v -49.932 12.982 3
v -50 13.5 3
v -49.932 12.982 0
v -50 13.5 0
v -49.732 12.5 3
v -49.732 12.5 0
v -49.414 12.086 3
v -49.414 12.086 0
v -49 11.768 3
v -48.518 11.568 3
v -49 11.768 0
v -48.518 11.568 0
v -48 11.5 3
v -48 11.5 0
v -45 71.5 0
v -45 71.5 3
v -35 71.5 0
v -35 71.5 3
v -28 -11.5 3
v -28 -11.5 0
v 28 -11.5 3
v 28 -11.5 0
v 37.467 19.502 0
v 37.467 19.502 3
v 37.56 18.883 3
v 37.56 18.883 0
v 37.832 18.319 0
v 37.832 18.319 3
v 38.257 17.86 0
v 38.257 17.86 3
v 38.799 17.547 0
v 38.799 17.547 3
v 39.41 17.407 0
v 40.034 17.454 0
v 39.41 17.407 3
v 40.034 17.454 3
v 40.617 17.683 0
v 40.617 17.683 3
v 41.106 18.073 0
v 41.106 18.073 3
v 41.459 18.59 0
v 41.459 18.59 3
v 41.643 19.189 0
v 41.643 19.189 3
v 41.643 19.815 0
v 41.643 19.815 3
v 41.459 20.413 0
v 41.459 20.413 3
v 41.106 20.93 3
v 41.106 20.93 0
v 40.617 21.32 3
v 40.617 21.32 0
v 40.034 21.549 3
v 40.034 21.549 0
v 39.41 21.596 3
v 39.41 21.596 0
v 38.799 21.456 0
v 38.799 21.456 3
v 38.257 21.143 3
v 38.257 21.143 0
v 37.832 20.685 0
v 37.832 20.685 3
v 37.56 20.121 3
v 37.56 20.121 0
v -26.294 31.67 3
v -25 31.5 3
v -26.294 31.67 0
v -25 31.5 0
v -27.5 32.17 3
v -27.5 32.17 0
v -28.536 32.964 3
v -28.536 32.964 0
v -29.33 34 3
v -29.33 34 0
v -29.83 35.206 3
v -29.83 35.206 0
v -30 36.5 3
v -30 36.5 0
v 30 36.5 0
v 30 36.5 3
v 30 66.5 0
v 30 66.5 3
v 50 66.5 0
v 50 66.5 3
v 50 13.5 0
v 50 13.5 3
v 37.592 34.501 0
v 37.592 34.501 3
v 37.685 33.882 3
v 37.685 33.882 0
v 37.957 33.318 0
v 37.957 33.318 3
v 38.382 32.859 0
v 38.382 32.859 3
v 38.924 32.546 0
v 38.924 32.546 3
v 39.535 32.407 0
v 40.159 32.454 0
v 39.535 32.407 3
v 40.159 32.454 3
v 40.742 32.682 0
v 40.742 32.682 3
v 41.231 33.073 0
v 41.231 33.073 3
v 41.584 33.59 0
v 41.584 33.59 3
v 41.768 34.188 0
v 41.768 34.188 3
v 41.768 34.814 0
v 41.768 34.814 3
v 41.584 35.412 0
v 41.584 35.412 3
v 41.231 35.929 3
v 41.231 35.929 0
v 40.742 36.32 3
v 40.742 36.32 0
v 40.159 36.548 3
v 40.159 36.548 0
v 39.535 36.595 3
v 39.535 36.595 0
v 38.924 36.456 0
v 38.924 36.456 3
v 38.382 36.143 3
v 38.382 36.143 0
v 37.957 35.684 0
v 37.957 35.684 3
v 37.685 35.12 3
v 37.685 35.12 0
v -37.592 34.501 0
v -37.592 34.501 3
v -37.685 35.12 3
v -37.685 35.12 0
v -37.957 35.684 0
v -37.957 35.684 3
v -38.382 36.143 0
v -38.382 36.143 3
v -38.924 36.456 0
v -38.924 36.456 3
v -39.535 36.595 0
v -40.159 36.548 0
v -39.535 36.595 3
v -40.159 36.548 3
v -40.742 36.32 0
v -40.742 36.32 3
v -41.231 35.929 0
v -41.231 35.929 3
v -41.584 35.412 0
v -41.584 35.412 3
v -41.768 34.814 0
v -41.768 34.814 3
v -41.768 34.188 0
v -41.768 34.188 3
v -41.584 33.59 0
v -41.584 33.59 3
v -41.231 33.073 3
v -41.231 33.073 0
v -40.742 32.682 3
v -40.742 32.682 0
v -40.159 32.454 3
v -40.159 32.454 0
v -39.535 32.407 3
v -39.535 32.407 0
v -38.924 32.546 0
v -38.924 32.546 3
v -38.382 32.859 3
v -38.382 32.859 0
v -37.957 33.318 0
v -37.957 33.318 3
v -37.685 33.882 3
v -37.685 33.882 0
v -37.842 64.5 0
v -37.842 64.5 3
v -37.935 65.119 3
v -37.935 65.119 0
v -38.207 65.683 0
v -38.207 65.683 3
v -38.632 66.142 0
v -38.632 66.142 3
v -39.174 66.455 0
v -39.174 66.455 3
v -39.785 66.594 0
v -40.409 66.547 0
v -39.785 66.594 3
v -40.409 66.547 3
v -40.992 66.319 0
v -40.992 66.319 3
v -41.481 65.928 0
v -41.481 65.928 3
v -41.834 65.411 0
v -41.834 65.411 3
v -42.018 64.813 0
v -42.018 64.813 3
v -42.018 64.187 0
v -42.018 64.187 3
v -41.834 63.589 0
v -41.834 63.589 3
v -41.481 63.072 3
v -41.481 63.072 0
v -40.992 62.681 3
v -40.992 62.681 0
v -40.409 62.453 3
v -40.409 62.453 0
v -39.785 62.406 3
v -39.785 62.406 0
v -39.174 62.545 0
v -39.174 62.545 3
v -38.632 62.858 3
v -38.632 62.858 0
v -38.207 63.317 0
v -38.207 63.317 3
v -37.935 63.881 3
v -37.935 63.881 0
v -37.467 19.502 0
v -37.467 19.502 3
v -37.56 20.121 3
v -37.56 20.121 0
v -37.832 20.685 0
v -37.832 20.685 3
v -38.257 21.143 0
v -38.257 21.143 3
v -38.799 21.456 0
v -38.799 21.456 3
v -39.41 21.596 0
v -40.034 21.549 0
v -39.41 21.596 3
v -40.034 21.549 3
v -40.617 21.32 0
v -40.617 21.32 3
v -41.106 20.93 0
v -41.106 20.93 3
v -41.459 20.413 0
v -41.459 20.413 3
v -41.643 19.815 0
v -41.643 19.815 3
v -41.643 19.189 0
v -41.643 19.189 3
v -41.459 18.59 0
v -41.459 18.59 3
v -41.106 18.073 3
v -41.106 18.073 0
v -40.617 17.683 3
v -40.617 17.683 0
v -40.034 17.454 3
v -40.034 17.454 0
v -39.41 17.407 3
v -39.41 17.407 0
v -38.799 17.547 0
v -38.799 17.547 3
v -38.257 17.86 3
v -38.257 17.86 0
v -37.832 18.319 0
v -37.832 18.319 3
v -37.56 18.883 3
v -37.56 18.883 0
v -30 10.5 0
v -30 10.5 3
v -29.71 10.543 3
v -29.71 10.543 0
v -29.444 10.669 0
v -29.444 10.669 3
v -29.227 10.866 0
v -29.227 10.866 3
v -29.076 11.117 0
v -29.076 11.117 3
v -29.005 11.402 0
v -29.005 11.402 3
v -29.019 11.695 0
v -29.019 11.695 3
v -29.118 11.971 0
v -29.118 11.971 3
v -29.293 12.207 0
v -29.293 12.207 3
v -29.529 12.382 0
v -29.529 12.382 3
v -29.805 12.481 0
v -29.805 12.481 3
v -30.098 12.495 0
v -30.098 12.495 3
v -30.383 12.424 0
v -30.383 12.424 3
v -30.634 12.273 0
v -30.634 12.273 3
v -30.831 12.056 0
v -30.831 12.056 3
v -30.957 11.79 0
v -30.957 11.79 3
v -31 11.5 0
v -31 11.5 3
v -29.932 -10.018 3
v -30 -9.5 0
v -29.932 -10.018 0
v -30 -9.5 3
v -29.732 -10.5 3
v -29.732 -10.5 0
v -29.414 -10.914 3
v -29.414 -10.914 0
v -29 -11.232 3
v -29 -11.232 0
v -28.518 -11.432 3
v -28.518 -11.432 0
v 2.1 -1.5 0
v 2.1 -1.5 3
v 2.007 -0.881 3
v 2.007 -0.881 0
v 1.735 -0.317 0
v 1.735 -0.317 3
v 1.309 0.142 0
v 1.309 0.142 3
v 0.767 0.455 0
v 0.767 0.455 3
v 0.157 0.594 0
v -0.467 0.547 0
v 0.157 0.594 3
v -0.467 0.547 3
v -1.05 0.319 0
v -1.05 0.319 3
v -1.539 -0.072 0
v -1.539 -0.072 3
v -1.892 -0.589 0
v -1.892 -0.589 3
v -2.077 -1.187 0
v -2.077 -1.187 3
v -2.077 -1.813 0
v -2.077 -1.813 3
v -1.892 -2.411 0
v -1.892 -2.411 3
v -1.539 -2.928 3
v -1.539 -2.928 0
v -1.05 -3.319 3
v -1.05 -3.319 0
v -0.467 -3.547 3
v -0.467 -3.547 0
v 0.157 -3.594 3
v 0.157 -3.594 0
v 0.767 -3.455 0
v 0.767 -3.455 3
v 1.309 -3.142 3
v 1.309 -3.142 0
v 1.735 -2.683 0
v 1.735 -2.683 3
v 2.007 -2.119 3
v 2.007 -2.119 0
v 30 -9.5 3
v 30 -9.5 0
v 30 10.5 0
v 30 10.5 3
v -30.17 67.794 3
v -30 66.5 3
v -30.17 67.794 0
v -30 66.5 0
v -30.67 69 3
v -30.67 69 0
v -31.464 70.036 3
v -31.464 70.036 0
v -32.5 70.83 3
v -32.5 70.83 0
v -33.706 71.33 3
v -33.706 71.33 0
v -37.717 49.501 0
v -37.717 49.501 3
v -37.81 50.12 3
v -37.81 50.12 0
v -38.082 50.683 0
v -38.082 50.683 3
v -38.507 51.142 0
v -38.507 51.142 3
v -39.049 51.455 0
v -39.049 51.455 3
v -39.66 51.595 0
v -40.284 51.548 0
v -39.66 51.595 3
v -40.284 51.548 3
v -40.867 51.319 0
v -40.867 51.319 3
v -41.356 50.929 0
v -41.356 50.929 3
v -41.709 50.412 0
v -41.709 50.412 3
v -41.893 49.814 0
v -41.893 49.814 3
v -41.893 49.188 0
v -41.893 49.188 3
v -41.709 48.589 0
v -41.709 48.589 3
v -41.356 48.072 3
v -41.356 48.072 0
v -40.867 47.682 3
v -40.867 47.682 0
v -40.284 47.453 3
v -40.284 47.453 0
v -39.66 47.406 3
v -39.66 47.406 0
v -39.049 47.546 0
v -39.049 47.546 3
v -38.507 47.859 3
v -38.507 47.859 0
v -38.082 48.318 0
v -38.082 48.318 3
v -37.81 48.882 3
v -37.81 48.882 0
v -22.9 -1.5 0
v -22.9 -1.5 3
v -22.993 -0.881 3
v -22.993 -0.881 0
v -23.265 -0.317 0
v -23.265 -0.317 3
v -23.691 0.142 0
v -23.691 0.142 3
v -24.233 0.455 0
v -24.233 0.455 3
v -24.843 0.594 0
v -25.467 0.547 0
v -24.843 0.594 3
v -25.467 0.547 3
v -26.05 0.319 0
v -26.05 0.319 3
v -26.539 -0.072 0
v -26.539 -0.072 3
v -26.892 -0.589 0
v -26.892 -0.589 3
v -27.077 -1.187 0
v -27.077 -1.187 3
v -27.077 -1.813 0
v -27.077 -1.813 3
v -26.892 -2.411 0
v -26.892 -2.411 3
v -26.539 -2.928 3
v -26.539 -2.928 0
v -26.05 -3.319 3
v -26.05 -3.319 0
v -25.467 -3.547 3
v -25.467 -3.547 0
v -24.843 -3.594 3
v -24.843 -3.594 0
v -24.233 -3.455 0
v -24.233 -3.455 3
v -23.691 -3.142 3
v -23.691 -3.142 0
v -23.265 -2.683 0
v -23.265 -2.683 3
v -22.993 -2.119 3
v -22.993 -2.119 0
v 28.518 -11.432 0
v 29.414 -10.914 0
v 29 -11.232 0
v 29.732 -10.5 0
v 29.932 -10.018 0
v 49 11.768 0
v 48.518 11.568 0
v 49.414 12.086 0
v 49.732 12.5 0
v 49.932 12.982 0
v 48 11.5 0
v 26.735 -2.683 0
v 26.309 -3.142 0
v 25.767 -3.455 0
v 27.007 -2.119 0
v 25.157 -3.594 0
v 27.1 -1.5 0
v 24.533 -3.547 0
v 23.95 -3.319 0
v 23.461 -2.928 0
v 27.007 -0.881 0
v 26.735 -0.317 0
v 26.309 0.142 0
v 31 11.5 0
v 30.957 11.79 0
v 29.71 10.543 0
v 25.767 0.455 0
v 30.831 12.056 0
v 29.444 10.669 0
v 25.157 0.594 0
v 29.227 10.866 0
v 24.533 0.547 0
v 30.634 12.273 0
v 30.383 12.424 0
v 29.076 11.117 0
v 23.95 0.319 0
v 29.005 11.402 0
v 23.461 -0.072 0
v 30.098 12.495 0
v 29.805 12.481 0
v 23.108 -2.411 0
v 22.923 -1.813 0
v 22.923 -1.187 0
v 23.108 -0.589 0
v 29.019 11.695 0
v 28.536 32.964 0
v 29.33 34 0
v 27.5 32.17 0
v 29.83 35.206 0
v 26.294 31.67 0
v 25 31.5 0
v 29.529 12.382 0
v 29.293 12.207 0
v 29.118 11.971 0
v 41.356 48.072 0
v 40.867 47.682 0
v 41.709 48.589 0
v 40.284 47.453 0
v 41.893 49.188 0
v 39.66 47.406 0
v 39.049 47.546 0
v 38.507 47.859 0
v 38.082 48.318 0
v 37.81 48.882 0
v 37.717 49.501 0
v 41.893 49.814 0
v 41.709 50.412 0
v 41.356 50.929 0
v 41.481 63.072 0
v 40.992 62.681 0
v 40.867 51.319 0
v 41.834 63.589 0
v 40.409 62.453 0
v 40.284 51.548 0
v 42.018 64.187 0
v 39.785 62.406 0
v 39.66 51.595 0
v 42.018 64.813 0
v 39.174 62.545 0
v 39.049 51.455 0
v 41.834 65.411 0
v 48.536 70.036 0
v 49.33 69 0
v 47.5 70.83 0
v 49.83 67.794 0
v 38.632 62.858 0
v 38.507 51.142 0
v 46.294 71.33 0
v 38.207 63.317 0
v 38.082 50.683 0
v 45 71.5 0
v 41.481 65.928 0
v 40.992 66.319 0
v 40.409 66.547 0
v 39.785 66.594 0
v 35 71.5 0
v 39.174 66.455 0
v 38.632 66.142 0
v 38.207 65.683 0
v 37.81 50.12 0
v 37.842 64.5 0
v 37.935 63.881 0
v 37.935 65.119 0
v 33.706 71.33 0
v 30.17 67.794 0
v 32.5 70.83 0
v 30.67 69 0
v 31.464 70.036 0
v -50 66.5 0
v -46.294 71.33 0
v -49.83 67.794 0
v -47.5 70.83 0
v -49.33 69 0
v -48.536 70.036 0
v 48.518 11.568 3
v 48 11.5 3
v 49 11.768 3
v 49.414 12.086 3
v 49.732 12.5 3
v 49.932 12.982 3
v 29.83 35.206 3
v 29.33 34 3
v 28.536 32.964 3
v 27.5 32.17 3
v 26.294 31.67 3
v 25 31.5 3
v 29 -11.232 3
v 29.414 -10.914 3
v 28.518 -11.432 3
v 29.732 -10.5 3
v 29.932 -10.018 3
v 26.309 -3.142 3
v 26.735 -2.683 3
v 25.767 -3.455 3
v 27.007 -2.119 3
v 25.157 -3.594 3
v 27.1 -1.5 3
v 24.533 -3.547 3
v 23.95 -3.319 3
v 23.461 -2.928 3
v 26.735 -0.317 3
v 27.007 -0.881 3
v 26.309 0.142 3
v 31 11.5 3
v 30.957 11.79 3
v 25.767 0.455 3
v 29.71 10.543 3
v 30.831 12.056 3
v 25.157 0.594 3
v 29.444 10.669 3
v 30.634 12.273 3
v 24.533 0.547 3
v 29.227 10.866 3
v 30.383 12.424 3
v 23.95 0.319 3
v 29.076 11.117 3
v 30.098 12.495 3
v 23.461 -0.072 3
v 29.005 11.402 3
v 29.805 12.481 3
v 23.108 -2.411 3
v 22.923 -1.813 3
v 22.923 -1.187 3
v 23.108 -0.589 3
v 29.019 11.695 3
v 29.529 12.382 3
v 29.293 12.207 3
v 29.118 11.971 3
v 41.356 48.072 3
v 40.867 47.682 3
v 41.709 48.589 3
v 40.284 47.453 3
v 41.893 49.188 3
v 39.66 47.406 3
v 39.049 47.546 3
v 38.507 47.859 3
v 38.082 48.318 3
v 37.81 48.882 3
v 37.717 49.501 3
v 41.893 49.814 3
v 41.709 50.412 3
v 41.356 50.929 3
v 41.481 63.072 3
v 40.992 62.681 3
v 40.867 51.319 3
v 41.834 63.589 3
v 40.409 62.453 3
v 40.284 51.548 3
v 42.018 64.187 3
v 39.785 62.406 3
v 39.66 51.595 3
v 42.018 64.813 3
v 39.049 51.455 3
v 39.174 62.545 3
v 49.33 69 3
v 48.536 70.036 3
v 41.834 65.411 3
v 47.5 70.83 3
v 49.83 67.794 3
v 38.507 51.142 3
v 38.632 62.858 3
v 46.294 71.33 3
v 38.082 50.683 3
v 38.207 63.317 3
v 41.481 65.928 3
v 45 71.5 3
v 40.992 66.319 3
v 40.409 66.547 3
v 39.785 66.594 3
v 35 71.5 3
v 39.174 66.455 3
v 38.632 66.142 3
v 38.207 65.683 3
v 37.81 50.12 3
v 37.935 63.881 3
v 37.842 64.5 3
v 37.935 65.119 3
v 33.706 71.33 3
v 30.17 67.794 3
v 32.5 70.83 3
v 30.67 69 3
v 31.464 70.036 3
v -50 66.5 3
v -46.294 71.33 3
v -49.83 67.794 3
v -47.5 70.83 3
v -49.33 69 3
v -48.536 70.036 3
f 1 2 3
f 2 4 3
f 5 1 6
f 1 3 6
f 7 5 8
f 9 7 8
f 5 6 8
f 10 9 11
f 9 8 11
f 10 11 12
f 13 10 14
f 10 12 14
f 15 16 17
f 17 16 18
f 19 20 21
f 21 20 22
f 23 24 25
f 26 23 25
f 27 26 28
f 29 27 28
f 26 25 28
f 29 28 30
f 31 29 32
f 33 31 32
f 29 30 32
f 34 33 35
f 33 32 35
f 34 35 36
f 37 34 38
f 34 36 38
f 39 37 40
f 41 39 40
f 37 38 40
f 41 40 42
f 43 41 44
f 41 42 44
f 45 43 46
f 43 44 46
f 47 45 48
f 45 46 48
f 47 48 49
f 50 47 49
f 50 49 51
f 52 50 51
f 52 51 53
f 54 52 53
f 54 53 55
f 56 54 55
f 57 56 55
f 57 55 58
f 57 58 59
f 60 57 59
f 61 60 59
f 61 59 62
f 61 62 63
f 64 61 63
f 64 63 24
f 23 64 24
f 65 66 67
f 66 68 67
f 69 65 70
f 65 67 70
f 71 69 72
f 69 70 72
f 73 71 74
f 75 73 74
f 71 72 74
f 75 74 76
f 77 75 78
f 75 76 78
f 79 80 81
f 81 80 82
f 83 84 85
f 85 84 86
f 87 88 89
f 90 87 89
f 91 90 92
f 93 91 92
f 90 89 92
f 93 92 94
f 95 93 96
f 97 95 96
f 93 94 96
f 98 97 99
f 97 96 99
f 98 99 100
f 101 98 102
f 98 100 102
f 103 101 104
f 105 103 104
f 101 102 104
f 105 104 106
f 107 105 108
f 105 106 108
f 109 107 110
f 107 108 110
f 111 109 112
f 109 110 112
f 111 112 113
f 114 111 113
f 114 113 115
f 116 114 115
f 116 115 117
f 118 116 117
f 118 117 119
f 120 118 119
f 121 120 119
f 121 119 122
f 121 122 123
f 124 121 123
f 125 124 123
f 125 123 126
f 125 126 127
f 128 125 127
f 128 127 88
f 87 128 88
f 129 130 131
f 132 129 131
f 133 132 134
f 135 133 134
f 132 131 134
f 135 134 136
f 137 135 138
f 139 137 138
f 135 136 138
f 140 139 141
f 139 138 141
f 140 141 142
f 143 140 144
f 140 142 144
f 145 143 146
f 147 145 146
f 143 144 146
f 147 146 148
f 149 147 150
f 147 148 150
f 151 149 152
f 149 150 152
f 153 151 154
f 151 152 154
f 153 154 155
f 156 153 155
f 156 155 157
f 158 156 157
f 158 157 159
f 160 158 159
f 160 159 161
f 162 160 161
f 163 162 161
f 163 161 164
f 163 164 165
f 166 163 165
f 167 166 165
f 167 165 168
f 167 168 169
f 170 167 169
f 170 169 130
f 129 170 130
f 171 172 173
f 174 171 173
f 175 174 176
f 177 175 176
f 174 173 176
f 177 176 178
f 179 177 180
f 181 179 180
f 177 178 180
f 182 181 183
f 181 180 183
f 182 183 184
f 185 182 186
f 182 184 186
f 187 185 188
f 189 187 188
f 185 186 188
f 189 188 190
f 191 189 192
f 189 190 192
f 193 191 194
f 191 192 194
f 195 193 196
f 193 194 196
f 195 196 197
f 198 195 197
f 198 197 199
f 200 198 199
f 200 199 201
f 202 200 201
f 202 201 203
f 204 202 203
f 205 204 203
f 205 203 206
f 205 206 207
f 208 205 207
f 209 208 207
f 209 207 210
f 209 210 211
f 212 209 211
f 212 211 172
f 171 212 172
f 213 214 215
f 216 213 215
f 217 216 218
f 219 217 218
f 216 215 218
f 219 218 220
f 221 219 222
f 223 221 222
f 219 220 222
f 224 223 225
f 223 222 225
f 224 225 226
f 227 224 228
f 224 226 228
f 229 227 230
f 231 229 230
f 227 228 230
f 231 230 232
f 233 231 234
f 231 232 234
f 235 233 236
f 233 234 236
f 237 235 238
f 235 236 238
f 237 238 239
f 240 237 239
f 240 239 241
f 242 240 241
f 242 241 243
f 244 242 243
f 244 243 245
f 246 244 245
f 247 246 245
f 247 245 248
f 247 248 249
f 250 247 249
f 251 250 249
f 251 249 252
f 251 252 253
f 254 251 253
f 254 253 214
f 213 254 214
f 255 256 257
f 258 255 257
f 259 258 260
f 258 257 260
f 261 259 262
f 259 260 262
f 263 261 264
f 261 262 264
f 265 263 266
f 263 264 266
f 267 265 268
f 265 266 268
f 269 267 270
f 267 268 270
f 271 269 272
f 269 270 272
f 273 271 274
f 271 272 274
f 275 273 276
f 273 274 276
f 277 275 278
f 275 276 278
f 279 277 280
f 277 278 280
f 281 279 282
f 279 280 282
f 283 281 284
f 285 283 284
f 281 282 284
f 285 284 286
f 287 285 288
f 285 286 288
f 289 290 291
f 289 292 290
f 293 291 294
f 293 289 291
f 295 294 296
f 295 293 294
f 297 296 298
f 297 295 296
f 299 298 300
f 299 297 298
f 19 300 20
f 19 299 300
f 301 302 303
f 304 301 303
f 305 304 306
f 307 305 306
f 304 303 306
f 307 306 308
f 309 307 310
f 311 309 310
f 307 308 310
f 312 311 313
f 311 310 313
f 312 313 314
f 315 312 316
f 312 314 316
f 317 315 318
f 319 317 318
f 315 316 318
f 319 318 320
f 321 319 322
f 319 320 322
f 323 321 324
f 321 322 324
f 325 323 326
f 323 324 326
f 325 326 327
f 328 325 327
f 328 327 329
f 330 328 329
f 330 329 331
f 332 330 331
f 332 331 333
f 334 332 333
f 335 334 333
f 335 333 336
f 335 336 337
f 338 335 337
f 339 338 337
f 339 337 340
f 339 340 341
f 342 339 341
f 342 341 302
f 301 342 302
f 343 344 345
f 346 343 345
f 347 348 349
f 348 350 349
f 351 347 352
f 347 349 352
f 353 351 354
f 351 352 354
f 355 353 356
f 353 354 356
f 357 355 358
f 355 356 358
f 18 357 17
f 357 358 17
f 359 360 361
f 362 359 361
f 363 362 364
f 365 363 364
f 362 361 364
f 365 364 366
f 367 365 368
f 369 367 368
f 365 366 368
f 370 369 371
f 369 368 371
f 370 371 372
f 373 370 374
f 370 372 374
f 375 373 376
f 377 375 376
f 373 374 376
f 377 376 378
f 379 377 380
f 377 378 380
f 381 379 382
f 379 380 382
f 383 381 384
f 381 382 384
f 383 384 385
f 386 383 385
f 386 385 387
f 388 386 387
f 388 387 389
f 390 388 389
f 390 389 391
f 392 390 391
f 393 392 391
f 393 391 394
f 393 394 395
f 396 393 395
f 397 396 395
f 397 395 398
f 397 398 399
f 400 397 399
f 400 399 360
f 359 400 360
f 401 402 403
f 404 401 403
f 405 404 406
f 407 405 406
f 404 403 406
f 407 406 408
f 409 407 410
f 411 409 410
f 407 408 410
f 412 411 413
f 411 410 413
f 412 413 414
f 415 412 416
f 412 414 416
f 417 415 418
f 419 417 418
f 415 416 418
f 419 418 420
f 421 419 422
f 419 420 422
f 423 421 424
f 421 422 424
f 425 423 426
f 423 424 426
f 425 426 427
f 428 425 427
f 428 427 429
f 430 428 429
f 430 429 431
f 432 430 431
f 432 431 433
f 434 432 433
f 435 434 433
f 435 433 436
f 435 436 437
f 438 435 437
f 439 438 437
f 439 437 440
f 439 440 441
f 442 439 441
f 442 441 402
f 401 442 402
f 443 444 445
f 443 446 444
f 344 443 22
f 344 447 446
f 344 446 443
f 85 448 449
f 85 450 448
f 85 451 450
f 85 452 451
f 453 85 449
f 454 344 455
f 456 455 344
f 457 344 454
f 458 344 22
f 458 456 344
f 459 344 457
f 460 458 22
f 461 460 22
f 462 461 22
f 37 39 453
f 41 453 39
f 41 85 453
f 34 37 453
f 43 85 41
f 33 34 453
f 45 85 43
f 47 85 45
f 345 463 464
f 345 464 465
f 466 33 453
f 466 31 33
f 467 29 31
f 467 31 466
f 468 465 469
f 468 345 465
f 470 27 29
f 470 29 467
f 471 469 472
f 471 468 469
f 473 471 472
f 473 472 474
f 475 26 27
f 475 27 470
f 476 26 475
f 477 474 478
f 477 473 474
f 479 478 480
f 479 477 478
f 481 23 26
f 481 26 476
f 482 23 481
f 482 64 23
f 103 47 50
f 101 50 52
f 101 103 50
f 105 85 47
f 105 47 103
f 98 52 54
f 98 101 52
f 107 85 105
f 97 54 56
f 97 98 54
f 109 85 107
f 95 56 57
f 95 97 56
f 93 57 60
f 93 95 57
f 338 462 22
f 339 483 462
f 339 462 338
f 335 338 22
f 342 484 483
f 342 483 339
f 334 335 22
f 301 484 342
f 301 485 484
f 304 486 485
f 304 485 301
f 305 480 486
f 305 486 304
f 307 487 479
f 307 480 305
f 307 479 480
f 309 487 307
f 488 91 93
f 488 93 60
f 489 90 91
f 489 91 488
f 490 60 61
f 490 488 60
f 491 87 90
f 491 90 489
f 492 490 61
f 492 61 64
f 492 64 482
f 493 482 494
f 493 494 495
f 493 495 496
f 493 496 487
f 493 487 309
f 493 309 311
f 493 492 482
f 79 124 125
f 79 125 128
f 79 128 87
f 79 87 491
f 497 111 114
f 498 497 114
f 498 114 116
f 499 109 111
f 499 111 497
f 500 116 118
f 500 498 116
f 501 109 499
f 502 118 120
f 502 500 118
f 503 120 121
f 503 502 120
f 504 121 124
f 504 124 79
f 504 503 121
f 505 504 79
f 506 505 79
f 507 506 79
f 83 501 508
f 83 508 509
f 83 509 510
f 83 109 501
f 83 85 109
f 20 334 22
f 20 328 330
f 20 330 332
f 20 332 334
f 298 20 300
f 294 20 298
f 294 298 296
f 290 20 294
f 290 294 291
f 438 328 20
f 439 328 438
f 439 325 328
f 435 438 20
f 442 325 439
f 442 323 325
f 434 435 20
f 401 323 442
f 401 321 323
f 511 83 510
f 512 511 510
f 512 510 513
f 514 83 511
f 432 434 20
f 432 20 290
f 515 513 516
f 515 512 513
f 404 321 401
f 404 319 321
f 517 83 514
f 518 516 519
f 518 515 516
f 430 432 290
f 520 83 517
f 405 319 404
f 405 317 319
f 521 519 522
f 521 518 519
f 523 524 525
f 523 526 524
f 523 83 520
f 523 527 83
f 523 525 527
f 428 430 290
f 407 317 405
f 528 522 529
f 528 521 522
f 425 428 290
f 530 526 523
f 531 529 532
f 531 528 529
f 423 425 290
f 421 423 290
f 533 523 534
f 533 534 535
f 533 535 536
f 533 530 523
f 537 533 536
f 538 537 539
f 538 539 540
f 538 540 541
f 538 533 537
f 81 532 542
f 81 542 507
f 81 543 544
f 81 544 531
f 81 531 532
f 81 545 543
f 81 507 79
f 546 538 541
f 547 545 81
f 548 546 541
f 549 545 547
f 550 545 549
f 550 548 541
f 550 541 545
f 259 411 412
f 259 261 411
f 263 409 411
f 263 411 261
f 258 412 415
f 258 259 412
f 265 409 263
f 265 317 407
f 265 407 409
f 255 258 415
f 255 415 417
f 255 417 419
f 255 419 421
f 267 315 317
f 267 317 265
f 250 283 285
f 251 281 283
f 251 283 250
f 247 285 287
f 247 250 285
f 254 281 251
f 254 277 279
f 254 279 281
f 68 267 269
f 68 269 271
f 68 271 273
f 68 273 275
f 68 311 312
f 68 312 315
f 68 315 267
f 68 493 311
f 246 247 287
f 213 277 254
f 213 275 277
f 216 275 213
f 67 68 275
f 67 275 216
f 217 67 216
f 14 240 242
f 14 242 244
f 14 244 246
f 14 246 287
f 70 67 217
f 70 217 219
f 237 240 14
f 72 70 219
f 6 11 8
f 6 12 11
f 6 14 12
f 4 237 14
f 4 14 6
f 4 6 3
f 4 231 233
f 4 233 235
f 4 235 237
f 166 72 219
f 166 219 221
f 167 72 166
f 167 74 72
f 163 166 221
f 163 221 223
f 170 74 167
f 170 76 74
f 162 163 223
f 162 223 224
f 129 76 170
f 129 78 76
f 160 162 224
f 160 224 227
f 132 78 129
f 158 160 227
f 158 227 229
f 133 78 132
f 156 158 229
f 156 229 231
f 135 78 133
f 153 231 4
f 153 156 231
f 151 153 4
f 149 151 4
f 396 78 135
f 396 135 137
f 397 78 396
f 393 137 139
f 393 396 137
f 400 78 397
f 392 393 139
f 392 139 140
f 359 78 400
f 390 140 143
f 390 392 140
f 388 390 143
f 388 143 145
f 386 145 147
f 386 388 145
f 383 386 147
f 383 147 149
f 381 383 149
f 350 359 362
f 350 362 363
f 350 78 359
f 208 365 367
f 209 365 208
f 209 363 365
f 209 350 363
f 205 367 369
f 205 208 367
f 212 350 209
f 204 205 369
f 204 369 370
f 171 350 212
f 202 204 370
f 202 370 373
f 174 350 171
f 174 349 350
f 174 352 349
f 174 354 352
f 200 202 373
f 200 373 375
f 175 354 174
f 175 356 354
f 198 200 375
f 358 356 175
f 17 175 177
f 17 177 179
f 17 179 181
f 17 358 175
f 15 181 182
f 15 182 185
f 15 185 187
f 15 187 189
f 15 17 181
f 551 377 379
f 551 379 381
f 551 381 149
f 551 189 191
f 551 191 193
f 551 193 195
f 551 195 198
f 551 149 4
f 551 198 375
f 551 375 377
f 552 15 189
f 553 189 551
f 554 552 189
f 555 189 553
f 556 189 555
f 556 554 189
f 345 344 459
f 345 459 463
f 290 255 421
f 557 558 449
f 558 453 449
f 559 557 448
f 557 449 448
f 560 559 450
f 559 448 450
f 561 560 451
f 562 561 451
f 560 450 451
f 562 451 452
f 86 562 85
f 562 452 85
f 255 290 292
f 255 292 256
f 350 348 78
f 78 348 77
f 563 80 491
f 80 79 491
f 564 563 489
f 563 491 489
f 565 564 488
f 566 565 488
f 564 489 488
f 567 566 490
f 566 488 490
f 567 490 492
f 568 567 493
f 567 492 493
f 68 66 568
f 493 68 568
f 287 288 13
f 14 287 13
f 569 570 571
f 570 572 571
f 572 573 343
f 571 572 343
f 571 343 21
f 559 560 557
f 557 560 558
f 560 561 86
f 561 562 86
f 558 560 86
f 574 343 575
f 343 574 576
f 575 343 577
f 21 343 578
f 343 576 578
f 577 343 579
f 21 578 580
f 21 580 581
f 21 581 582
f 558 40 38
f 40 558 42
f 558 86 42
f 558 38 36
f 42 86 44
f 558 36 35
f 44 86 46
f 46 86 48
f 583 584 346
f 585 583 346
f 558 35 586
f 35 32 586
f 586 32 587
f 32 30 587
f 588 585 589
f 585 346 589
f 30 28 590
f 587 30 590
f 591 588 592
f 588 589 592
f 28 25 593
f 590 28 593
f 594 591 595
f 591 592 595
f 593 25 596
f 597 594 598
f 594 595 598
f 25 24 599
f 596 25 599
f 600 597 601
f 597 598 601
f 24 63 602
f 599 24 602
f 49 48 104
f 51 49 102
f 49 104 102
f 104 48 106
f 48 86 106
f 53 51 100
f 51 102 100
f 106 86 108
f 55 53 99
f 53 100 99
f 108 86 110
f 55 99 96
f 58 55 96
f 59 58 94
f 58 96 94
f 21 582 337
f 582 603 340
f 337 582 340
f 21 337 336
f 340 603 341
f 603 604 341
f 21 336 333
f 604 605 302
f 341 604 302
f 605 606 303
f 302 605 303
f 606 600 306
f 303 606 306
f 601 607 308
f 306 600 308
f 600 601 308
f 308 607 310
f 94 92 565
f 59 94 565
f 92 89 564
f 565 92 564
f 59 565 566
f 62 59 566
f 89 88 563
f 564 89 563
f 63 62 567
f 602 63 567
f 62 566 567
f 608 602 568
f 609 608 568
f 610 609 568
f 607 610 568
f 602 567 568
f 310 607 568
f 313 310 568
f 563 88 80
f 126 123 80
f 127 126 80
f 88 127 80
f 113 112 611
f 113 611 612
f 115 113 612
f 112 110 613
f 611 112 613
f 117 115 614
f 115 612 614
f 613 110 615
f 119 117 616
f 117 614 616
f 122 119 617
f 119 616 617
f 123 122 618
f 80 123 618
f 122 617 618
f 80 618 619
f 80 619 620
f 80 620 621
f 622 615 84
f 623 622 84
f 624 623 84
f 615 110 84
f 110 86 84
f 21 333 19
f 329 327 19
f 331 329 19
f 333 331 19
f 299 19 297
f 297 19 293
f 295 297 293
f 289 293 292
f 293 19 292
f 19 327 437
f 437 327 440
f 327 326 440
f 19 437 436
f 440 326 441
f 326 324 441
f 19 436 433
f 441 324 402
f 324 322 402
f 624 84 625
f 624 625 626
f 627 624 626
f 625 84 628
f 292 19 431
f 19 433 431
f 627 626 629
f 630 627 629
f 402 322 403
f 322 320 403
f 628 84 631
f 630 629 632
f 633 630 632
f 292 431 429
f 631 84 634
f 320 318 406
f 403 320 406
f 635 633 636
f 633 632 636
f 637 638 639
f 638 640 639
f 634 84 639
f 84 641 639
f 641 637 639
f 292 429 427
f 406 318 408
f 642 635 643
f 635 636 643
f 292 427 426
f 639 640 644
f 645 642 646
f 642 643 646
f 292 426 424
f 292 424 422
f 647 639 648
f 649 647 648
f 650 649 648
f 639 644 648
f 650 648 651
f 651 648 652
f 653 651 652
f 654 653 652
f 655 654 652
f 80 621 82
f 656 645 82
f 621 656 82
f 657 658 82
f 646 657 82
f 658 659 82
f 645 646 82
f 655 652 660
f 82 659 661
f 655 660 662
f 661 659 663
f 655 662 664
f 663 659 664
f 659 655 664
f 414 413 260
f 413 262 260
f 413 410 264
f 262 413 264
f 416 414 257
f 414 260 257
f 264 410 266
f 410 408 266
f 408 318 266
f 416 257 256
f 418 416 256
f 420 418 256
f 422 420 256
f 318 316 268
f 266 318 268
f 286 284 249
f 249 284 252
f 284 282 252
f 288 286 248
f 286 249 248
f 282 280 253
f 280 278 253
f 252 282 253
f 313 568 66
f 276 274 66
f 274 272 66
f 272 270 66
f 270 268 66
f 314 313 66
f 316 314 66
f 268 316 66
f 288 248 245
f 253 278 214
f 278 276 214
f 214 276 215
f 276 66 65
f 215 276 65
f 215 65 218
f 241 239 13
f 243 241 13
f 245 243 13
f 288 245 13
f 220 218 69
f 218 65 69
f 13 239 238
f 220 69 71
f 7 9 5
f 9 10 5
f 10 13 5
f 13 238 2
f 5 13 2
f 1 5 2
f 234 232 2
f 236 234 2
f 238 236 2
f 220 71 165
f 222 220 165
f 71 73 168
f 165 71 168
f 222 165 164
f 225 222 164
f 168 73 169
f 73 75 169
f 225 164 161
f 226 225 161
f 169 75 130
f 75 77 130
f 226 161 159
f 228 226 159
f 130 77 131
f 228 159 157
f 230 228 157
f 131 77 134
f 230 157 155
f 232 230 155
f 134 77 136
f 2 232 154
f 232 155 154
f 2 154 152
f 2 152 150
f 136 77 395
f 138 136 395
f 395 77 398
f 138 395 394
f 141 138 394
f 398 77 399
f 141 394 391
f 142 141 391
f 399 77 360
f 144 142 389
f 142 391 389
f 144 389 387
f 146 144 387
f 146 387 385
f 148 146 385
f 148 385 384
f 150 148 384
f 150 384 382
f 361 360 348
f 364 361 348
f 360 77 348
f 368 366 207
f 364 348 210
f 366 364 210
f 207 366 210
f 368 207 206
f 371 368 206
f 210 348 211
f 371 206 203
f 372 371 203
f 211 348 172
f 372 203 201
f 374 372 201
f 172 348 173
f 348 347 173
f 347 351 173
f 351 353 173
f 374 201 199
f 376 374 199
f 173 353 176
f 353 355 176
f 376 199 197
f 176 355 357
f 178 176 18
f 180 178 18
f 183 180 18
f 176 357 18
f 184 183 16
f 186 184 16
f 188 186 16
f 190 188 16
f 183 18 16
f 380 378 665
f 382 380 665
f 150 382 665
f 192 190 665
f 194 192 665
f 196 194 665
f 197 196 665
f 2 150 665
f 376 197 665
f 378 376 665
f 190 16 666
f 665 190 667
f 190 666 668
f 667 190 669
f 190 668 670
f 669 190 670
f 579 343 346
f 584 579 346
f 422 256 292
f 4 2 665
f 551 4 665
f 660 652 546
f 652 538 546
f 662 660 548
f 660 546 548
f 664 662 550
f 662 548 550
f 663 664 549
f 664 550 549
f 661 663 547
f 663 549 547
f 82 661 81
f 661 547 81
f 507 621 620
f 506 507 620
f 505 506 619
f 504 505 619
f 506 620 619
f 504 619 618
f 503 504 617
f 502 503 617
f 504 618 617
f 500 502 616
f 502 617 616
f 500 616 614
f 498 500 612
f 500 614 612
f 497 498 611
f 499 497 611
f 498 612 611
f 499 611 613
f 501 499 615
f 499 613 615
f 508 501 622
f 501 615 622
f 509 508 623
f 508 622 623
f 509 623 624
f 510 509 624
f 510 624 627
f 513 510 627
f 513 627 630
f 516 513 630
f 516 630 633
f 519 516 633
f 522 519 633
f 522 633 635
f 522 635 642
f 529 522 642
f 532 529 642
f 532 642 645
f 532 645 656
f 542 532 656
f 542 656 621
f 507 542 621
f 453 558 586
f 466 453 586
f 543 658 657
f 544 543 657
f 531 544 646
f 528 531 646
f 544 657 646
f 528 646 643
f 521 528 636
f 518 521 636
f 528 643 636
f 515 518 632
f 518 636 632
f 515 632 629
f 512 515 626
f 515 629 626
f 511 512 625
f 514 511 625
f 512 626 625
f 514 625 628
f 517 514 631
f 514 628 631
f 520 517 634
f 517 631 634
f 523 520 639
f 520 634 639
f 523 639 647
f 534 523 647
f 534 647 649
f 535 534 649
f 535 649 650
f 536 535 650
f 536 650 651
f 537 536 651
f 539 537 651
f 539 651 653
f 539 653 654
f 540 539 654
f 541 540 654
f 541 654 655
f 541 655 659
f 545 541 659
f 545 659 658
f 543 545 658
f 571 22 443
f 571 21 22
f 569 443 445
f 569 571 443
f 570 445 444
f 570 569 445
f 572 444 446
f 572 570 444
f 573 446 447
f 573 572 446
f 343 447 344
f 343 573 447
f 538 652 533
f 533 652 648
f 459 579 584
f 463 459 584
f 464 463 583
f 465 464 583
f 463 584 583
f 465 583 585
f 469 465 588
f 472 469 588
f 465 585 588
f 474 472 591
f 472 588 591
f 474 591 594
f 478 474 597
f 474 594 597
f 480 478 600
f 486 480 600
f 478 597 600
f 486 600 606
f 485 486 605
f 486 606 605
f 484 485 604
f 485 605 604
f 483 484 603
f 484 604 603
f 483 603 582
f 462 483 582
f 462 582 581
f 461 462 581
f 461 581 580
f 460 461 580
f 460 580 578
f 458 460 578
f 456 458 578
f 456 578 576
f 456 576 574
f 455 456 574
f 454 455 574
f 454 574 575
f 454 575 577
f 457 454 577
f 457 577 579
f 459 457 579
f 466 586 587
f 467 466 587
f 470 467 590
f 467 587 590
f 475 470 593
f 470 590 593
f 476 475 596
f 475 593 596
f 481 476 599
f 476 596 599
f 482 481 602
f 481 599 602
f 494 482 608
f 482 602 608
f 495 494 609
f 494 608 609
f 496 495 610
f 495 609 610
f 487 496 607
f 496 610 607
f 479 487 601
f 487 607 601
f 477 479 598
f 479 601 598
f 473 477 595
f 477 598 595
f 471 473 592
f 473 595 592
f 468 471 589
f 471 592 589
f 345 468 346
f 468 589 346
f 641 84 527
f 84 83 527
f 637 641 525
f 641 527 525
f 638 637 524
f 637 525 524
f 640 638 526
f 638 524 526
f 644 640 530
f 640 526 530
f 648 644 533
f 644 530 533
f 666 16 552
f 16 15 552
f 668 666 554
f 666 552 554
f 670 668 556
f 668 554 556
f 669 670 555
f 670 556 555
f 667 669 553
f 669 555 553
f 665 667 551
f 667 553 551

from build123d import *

# Parameters (mm, degrees)
SKETCH1_W           = 60
SKETCH1_H           = 23
BOSS_EXTRUDE1_DEPTH = 3
BOSS_EXTRUDE2_DEPTH = 3
SKETCH3_R           = 1
CUT_EXTRUDE1_DEPTH  = 88.299770905
FILLET1_R           = 2
SKETCH4_R           = 2.1
CUT_EXTRUDE2_DEPTH  = 88.299770905
SKETCH5_R           = 2.1
CUT_EXTRUDE3_DEPTH  = 88.299770905
FILLET2_R           = 5


with BuildPart() as part:
    # Sketch1 → Boss-Extrude1 (new body)
    with BuildSketch(Plane.XY):
        Rectangle(SKETCH1_W, SKETCH1_H)
    extrude(amount=BOSS_EXTRUDE1_DEPTH)

    # Sketch2 → Boss-Extrude2 (add)
    with BuildSketch(Plane.XY.offset(3)):
        Polygon((50, 11.5), (-50, 11.5), (-50, 71.5), (-30, 71.5), (-30, 31.5), (30, 31.5), (30, 71.5), (50, 71.5), align=None)
    extrude(amount=-BOSS_EXTRUDE2_DEPTH)

    # Sketch3 → Cut-Extrude1 (cut, through all)
    with BuildSketch(Plane.XY.offset(3)):
        with Locations((-30, 11.5)):
            Circle(SKETCH3_R)
        with Locations((30, 11.5)):
            Circle(SKETCH3_R)
    extrude(amount=-CUT_EXTRUDE1_DEPTH, mode=Mode.SUBTRACT)

    # Fillet1
    fillet1_edges = [part.edges().sort_by_distance(p)[0] for p in [
        (50, 11.5, 1.5),
        (-50, 11.5, 1.5),
        (30, -11.5, 1.5),
        (-30, -11.5, 1.5),
    ]]
    fillet(fillet1_edges, radius=FILLET1_R)

    # Sketch4 → Cut-Extrude2 (cut, through all)
    with BuildSketch(Plane.XY.offset(3)):
        with Locations((-25, -1.5)):
            Circle(SKETCH4_R)
        with Locations((0, -1.5)):
            Circle(SKETCH4_R)
        with Locations((25, -1.5)):
            Circle(SKETCH4_R)
    extrude(amount=-CUT_EXTRUDE2_DEPTH, mode=Mode.SUBTRACT)

    # Sketch5 → Cut-Extrude3 (cut, through all)
    with BuildSketch(Plane.XY.offset(3)):
        with Locations((-39.941666667, 64.5)):
            Circle(SKETCH5_R)
        with Locations((-39.816671007, 49.500520806)):
            Circle(SKETCH5_R)
        with Locations((-39.691675347, 34.501041612)):
            Circle(SKETCH5_R)
        with Locations((-39.566679687, 19.501562419)):
            Circle(SKETCH5_R)
        with Locations(Location((39.566679687, 19.501562419, 0), (0, 0, 180))):
            Circle(SKETCH5_R)
        with Locations(Location((39.691675347, 34.501041612, 0), (0, 0, 180))):
            Circle(SKETCH5_R)
        with Locations(Location((39.816671007, 49.500520806, 0), (0, 0, 180))):
            Circle(SKETCH5_R)
        with Locations(Location((39.941666667, 64.5, 0), (0, 0, 180))):
            Circle(SKETCH5_R)
    extrude(amount=-CUT_EXTRUDE3_DEPTH, mode=Mode.SUBTRACT)

    # Fillet2
    fillet2_edges = [part.edges().sort_by_distance(p)[0] for p in [
        (50, 71.5, 1.5),
        (30, 71.5, 1.5),
        (30, 31.5, 1.5),
        (-30, 31.5, 1.5),
        (-30, 71.5, 1.5),
        (-50, 71.5, 1.5),
    ]]
    fillet(fillet2_edges, radius=FILLET2_R)


solid = part.part
